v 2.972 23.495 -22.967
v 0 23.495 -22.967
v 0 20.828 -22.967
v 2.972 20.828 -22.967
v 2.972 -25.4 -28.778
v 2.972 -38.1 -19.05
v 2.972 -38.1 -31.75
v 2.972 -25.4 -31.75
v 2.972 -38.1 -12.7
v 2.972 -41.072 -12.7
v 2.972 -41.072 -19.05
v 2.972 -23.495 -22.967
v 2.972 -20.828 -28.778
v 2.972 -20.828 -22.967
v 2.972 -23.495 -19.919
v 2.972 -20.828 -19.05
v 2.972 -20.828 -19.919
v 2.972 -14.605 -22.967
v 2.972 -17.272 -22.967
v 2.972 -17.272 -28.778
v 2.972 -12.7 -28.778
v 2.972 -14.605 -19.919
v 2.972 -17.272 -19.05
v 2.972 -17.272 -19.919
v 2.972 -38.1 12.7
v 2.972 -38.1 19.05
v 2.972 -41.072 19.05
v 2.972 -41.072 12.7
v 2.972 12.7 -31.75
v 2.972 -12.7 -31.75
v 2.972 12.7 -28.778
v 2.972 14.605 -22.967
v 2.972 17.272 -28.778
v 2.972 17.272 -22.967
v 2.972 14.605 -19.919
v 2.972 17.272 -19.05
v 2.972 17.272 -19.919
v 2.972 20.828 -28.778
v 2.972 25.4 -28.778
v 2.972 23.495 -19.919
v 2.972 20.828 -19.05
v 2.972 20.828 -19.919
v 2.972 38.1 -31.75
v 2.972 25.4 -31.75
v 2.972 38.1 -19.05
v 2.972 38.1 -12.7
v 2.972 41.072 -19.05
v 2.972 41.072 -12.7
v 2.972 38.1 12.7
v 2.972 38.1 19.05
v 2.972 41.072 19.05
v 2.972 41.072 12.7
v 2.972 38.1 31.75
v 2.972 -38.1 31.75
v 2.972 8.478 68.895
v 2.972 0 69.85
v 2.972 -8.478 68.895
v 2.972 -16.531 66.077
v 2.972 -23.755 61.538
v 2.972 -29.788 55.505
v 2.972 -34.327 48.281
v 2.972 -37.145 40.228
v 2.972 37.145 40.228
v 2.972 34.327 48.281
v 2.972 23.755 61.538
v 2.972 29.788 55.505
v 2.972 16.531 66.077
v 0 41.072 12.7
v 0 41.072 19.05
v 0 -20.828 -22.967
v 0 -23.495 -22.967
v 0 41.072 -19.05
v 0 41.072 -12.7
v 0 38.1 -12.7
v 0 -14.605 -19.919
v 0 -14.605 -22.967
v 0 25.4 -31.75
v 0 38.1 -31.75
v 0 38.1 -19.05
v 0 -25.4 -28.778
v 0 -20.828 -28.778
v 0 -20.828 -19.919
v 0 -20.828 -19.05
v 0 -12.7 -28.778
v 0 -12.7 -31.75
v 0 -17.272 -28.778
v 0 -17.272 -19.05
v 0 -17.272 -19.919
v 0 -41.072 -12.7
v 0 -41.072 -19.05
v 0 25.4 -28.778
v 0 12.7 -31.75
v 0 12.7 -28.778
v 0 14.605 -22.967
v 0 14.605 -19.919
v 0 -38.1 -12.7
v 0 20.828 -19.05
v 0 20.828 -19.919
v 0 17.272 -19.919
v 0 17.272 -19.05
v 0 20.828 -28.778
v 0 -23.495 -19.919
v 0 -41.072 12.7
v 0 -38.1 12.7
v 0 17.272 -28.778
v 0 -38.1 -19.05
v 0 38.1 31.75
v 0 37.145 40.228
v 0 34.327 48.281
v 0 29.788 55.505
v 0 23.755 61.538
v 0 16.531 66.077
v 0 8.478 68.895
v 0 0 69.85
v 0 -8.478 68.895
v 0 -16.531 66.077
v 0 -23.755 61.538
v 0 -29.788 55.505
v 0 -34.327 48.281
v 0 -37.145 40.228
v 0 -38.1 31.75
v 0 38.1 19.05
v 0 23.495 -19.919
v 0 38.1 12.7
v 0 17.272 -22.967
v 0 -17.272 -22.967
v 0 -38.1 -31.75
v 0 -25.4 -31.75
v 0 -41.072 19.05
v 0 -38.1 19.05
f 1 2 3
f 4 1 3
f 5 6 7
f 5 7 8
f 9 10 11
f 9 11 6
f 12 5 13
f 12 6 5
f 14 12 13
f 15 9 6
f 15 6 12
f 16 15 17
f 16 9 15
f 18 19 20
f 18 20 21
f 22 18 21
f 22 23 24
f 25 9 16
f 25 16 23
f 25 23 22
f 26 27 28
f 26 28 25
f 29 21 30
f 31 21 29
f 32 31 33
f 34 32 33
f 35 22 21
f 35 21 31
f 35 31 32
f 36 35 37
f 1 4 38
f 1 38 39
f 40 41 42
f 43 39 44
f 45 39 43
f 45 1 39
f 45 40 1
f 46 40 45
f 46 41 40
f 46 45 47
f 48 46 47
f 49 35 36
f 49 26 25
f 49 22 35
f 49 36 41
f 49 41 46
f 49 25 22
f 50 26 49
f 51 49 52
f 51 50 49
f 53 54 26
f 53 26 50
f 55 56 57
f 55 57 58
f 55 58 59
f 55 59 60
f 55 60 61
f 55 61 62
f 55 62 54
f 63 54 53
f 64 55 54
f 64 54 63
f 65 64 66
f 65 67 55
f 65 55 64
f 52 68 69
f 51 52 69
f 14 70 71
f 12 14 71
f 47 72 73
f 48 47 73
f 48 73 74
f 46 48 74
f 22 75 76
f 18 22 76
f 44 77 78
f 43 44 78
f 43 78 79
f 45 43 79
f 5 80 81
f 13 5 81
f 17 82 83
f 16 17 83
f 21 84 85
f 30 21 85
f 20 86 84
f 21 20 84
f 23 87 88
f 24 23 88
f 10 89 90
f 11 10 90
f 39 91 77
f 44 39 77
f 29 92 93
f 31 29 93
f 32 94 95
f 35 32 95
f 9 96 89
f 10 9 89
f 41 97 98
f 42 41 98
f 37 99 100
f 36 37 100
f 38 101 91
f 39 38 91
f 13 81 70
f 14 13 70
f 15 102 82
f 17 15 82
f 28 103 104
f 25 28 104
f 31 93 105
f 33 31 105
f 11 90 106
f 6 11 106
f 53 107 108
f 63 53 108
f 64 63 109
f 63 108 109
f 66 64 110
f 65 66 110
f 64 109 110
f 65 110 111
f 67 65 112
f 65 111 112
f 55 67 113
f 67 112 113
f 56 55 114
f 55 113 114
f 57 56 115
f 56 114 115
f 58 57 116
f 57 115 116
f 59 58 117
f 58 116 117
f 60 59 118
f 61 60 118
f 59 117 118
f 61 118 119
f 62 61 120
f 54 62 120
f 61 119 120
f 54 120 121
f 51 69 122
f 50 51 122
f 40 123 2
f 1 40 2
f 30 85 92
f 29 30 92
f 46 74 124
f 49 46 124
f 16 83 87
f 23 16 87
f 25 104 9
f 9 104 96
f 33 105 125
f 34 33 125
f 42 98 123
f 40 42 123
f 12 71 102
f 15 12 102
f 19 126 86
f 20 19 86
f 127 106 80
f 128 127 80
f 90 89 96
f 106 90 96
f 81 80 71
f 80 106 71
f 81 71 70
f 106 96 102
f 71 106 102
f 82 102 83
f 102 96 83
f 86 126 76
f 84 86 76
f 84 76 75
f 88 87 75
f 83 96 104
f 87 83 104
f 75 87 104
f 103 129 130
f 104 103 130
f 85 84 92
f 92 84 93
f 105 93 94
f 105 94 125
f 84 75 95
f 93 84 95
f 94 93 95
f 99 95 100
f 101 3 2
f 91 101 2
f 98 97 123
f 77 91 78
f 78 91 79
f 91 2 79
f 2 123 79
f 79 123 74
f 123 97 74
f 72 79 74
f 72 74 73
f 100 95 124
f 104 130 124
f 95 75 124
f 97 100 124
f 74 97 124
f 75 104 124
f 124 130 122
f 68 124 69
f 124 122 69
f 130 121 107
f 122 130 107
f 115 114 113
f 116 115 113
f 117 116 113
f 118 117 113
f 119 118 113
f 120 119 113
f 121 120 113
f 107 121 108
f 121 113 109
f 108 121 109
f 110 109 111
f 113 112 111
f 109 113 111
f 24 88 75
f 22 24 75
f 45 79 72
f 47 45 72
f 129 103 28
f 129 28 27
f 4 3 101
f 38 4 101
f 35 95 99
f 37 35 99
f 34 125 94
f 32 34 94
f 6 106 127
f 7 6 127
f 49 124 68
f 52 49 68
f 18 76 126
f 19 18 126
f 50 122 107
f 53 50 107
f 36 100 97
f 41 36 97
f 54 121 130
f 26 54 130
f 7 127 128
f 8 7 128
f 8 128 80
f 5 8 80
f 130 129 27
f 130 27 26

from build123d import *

# Parameters (mm, degrees)
F0_W     = 2.9718
F0_H     = 6.35
F1_DEPTH = 2.9718


with BuildPart() as f1:
    # F0 (on Right) → F1 (new body)
    with BuildSketch(Plane.YZ):
        Polygon((38.1, 19.05), (38.1, 31.75), (-38.1, 31.75), (-38.1, 19.05), (-38.1, 12.7), (-38.1, -12.7), (-41.0718, -12.7), (-41.0718, -19.05), (-38.1, -19.05), (-38.1, -31.75), (-25.4, -31.75), (-25.4, -28.7782), (-20.828, -28.7782), (-20.828, -22.967306), (-23.495, -22.967306), (-23.495, -19.919306), (-20.828, -19.919306), (-20.828, -19.05), (-17.272, -19.05), (-17.272, -19.919306), (-14.605, -19.919306), (-14.605, -22.967306), (-17.272, -22.967306), (-17.272, -28.7782), (-12.7, -28.7782), (-12.7, -31.75), (12.7, -31.75), (12.7, -28.7782), (17.272, -28.7782), (17.272, -22.967306), (14.605, -22.967306), (14.605, -19.919306), (17.272, -19.919306), (17.272, -19.05), (20.828, -19.05), (20.828, -19.919306), (23.495, -19.919306), (23.495, -22.967306), (20.828, -22.967306), (20.828, -28.7782), (25.4, -28.7782), (25.4, -31.75), (38.1, -31.75), (38.1, -19.05), (41.0718, -19.05), (41.0718, -12.7), (38.1, -12.7), (38.1, 12.7), (41.0718, 12.7), (41.0718, 19.05), align=None)
        with BuildLine():
            Line((-38.1, 31.75), (38.1, 31.75))
            ThreePointArc((38.1, 31.75), (0, 69.85), (-38.1, 31.75))
        make_face()
        with Locations((-39.5859, 15.875)):
            Rectangle(F0_W, F0_H)
    extrude(amount=F1_DEPTH)


solid = f1.part
